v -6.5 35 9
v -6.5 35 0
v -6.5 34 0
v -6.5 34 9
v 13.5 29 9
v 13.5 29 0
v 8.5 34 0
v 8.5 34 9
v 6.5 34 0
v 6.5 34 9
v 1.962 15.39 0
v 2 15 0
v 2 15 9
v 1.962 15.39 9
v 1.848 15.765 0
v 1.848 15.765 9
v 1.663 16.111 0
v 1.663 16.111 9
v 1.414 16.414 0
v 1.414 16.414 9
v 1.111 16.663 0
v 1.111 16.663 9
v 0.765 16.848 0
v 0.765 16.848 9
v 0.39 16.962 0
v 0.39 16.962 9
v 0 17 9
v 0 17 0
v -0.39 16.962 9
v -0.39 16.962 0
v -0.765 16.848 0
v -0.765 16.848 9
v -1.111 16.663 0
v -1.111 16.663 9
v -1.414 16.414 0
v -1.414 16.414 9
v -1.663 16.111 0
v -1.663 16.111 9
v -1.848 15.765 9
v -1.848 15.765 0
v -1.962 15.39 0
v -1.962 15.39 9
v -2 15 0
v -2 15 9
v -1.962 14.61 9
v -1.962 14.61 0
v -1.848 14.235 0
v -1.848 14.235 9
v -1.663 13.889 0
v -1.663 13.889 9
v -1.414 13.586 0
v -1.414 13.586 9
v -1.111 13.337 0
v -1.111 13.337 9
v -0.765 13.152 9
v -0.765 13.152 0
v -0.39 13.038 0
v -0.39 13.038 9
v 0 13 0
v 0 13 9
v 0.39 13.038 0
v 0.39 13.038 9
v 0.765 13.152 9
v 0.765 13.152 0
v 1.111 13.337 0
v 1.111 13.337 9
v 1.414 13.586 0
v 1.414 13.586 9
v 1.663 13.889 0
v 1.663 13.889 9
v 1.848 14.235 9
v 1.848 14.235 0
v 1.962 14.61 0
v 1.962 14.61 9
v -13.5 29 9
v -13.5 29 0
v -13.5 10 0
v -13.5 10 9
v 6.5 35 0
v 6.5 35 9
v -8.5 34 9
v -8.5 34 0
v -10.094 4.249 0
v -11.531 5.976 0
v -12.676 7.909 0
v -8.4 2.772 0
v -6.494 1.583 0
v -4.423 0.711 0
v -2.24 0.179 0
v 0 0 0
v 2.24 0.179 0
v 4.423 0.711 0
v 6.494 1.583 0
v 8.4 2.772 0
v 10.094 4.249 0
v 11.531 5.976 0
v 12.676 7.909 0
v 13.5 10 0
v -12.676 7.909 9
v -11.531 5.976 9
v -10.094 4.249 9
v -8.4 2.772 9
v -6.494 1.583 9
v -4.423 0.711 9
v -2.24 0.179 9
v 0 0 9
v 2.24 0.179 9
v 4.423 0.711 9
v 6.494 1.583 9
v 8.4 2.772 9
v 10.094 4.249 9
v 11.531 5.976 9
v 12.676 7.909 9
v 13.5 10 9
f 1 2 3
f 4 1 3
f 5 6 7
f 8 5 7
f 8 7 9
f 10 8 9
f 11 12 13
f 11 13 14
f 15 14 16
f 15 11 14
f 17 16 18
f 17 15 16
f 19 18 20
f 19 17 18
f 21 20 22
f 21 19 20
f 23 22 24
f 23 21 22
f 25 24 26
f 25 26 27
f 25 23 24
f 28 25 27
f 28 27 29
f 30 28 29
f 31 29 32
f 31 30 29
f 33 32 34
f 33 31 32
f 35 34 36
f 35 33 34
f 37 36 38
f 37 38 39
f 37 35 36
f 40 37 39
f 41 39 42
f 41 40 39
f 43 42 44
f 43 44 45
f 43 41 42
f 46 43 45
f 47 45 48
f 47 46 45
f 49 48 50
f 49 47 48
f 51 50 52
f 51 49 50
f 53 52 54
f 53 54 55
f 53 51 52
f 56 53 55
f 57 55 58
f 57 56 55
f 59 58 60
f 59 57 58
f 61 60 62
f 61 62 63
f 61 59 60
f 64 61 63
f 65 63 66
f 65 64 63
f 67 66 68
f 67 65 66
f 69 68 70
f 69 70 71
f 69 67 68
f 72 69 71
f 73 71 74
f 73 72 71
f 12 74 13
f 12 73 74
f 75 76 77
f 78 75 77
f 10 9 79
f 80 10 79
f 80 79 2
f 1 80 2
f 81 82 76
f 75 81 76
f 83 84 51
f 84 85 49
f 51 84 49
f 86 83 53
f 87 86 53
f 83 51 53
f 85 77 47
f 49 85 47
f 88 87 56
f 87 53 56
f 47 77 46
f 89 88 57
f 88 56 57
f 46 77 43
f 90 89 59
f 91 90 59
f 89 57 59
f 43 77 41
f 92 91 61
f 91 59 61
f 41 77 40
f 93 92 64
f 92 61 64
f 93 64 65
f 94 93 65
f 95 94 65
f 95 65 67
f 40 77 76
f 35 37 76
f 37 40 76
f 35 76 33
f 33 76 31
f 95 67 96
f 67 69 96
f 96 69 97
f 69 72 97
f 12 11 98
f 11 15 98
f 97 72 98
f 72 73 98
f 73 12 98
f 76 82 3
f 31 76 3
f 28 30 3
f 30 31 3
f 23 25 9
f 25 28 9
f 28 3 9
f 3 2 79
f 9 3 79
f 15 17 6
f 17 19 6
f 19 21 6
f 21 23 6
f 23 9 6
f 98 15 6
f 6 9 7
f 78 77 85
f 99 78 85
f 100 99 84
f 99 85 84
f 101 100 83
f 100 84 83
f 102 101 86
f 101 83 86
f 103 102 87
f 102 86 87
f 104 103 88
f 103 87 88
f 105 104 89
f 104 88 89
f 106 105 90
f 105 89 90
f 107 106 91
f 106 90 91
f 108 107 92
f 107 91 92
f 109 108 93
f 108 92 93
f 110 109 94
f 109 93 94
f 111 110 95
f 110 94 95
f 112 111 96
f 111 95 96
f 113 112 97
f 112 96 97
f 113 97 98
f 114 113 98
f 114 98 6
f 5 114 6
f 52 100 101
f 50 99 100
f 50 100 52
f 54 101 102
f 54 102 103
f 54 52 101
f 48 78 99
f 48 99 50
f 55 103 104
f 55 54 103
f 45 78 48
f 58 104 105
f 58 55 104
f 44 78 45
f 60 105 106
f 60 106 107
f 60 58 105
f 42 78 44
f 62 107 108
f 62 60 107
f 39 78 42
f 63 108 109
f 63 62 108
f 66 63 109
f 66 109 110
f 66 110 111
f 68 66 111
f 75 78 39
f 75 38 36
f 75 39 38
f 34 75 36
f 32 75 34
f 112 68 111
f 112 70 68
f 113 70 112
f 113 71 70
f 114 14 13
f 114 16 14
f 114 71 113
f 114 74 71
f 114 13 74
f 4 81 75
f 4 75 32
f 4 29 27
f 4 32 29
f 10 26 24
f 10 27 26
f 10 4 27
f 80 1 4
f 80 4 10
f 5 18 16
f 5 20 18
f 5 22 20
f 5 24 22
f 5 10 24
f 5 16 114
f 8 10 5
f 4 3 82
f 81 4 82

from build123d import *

# Parameters (mm, degrees)
ESQUISSE1_R        = 2
BOSS_EXTRU_2_DEPTH = 9


with BuildPart() as part:
    # Esquisse1 → Boss.-Extru.2 (new body)
    with BuildSketch(Plane.XY):
        with BuildLine():
            Line((6.5, 35), (-6.5, 35))
            Line((-6.5, 35), (-6.5, 34))
            Line((-6.5, 34), (-8.5, 34))
            Line((-8.5, 34), (-13.5, 29))
            Line((-13.5, 29), (-13.5, 10))
            ThreePointArc((-13.5, 10), (0, 0), (13.5, 10))
            Line((13.5, 10), (13.5, 29))
            Line((13.5, 29), (8.5, 34))
            Line((8.5, 34), (6.5, 34))
            Line((6.5, 34), (6.5, 35))
        make_face()
        with Locations((0, 15)):
            Circle(ESQUISSE1_R, mode=Mode.SUBTRACT)
    extrude(amount=BOSS_EXTRU_2_DEPTH)


solid = part.part
